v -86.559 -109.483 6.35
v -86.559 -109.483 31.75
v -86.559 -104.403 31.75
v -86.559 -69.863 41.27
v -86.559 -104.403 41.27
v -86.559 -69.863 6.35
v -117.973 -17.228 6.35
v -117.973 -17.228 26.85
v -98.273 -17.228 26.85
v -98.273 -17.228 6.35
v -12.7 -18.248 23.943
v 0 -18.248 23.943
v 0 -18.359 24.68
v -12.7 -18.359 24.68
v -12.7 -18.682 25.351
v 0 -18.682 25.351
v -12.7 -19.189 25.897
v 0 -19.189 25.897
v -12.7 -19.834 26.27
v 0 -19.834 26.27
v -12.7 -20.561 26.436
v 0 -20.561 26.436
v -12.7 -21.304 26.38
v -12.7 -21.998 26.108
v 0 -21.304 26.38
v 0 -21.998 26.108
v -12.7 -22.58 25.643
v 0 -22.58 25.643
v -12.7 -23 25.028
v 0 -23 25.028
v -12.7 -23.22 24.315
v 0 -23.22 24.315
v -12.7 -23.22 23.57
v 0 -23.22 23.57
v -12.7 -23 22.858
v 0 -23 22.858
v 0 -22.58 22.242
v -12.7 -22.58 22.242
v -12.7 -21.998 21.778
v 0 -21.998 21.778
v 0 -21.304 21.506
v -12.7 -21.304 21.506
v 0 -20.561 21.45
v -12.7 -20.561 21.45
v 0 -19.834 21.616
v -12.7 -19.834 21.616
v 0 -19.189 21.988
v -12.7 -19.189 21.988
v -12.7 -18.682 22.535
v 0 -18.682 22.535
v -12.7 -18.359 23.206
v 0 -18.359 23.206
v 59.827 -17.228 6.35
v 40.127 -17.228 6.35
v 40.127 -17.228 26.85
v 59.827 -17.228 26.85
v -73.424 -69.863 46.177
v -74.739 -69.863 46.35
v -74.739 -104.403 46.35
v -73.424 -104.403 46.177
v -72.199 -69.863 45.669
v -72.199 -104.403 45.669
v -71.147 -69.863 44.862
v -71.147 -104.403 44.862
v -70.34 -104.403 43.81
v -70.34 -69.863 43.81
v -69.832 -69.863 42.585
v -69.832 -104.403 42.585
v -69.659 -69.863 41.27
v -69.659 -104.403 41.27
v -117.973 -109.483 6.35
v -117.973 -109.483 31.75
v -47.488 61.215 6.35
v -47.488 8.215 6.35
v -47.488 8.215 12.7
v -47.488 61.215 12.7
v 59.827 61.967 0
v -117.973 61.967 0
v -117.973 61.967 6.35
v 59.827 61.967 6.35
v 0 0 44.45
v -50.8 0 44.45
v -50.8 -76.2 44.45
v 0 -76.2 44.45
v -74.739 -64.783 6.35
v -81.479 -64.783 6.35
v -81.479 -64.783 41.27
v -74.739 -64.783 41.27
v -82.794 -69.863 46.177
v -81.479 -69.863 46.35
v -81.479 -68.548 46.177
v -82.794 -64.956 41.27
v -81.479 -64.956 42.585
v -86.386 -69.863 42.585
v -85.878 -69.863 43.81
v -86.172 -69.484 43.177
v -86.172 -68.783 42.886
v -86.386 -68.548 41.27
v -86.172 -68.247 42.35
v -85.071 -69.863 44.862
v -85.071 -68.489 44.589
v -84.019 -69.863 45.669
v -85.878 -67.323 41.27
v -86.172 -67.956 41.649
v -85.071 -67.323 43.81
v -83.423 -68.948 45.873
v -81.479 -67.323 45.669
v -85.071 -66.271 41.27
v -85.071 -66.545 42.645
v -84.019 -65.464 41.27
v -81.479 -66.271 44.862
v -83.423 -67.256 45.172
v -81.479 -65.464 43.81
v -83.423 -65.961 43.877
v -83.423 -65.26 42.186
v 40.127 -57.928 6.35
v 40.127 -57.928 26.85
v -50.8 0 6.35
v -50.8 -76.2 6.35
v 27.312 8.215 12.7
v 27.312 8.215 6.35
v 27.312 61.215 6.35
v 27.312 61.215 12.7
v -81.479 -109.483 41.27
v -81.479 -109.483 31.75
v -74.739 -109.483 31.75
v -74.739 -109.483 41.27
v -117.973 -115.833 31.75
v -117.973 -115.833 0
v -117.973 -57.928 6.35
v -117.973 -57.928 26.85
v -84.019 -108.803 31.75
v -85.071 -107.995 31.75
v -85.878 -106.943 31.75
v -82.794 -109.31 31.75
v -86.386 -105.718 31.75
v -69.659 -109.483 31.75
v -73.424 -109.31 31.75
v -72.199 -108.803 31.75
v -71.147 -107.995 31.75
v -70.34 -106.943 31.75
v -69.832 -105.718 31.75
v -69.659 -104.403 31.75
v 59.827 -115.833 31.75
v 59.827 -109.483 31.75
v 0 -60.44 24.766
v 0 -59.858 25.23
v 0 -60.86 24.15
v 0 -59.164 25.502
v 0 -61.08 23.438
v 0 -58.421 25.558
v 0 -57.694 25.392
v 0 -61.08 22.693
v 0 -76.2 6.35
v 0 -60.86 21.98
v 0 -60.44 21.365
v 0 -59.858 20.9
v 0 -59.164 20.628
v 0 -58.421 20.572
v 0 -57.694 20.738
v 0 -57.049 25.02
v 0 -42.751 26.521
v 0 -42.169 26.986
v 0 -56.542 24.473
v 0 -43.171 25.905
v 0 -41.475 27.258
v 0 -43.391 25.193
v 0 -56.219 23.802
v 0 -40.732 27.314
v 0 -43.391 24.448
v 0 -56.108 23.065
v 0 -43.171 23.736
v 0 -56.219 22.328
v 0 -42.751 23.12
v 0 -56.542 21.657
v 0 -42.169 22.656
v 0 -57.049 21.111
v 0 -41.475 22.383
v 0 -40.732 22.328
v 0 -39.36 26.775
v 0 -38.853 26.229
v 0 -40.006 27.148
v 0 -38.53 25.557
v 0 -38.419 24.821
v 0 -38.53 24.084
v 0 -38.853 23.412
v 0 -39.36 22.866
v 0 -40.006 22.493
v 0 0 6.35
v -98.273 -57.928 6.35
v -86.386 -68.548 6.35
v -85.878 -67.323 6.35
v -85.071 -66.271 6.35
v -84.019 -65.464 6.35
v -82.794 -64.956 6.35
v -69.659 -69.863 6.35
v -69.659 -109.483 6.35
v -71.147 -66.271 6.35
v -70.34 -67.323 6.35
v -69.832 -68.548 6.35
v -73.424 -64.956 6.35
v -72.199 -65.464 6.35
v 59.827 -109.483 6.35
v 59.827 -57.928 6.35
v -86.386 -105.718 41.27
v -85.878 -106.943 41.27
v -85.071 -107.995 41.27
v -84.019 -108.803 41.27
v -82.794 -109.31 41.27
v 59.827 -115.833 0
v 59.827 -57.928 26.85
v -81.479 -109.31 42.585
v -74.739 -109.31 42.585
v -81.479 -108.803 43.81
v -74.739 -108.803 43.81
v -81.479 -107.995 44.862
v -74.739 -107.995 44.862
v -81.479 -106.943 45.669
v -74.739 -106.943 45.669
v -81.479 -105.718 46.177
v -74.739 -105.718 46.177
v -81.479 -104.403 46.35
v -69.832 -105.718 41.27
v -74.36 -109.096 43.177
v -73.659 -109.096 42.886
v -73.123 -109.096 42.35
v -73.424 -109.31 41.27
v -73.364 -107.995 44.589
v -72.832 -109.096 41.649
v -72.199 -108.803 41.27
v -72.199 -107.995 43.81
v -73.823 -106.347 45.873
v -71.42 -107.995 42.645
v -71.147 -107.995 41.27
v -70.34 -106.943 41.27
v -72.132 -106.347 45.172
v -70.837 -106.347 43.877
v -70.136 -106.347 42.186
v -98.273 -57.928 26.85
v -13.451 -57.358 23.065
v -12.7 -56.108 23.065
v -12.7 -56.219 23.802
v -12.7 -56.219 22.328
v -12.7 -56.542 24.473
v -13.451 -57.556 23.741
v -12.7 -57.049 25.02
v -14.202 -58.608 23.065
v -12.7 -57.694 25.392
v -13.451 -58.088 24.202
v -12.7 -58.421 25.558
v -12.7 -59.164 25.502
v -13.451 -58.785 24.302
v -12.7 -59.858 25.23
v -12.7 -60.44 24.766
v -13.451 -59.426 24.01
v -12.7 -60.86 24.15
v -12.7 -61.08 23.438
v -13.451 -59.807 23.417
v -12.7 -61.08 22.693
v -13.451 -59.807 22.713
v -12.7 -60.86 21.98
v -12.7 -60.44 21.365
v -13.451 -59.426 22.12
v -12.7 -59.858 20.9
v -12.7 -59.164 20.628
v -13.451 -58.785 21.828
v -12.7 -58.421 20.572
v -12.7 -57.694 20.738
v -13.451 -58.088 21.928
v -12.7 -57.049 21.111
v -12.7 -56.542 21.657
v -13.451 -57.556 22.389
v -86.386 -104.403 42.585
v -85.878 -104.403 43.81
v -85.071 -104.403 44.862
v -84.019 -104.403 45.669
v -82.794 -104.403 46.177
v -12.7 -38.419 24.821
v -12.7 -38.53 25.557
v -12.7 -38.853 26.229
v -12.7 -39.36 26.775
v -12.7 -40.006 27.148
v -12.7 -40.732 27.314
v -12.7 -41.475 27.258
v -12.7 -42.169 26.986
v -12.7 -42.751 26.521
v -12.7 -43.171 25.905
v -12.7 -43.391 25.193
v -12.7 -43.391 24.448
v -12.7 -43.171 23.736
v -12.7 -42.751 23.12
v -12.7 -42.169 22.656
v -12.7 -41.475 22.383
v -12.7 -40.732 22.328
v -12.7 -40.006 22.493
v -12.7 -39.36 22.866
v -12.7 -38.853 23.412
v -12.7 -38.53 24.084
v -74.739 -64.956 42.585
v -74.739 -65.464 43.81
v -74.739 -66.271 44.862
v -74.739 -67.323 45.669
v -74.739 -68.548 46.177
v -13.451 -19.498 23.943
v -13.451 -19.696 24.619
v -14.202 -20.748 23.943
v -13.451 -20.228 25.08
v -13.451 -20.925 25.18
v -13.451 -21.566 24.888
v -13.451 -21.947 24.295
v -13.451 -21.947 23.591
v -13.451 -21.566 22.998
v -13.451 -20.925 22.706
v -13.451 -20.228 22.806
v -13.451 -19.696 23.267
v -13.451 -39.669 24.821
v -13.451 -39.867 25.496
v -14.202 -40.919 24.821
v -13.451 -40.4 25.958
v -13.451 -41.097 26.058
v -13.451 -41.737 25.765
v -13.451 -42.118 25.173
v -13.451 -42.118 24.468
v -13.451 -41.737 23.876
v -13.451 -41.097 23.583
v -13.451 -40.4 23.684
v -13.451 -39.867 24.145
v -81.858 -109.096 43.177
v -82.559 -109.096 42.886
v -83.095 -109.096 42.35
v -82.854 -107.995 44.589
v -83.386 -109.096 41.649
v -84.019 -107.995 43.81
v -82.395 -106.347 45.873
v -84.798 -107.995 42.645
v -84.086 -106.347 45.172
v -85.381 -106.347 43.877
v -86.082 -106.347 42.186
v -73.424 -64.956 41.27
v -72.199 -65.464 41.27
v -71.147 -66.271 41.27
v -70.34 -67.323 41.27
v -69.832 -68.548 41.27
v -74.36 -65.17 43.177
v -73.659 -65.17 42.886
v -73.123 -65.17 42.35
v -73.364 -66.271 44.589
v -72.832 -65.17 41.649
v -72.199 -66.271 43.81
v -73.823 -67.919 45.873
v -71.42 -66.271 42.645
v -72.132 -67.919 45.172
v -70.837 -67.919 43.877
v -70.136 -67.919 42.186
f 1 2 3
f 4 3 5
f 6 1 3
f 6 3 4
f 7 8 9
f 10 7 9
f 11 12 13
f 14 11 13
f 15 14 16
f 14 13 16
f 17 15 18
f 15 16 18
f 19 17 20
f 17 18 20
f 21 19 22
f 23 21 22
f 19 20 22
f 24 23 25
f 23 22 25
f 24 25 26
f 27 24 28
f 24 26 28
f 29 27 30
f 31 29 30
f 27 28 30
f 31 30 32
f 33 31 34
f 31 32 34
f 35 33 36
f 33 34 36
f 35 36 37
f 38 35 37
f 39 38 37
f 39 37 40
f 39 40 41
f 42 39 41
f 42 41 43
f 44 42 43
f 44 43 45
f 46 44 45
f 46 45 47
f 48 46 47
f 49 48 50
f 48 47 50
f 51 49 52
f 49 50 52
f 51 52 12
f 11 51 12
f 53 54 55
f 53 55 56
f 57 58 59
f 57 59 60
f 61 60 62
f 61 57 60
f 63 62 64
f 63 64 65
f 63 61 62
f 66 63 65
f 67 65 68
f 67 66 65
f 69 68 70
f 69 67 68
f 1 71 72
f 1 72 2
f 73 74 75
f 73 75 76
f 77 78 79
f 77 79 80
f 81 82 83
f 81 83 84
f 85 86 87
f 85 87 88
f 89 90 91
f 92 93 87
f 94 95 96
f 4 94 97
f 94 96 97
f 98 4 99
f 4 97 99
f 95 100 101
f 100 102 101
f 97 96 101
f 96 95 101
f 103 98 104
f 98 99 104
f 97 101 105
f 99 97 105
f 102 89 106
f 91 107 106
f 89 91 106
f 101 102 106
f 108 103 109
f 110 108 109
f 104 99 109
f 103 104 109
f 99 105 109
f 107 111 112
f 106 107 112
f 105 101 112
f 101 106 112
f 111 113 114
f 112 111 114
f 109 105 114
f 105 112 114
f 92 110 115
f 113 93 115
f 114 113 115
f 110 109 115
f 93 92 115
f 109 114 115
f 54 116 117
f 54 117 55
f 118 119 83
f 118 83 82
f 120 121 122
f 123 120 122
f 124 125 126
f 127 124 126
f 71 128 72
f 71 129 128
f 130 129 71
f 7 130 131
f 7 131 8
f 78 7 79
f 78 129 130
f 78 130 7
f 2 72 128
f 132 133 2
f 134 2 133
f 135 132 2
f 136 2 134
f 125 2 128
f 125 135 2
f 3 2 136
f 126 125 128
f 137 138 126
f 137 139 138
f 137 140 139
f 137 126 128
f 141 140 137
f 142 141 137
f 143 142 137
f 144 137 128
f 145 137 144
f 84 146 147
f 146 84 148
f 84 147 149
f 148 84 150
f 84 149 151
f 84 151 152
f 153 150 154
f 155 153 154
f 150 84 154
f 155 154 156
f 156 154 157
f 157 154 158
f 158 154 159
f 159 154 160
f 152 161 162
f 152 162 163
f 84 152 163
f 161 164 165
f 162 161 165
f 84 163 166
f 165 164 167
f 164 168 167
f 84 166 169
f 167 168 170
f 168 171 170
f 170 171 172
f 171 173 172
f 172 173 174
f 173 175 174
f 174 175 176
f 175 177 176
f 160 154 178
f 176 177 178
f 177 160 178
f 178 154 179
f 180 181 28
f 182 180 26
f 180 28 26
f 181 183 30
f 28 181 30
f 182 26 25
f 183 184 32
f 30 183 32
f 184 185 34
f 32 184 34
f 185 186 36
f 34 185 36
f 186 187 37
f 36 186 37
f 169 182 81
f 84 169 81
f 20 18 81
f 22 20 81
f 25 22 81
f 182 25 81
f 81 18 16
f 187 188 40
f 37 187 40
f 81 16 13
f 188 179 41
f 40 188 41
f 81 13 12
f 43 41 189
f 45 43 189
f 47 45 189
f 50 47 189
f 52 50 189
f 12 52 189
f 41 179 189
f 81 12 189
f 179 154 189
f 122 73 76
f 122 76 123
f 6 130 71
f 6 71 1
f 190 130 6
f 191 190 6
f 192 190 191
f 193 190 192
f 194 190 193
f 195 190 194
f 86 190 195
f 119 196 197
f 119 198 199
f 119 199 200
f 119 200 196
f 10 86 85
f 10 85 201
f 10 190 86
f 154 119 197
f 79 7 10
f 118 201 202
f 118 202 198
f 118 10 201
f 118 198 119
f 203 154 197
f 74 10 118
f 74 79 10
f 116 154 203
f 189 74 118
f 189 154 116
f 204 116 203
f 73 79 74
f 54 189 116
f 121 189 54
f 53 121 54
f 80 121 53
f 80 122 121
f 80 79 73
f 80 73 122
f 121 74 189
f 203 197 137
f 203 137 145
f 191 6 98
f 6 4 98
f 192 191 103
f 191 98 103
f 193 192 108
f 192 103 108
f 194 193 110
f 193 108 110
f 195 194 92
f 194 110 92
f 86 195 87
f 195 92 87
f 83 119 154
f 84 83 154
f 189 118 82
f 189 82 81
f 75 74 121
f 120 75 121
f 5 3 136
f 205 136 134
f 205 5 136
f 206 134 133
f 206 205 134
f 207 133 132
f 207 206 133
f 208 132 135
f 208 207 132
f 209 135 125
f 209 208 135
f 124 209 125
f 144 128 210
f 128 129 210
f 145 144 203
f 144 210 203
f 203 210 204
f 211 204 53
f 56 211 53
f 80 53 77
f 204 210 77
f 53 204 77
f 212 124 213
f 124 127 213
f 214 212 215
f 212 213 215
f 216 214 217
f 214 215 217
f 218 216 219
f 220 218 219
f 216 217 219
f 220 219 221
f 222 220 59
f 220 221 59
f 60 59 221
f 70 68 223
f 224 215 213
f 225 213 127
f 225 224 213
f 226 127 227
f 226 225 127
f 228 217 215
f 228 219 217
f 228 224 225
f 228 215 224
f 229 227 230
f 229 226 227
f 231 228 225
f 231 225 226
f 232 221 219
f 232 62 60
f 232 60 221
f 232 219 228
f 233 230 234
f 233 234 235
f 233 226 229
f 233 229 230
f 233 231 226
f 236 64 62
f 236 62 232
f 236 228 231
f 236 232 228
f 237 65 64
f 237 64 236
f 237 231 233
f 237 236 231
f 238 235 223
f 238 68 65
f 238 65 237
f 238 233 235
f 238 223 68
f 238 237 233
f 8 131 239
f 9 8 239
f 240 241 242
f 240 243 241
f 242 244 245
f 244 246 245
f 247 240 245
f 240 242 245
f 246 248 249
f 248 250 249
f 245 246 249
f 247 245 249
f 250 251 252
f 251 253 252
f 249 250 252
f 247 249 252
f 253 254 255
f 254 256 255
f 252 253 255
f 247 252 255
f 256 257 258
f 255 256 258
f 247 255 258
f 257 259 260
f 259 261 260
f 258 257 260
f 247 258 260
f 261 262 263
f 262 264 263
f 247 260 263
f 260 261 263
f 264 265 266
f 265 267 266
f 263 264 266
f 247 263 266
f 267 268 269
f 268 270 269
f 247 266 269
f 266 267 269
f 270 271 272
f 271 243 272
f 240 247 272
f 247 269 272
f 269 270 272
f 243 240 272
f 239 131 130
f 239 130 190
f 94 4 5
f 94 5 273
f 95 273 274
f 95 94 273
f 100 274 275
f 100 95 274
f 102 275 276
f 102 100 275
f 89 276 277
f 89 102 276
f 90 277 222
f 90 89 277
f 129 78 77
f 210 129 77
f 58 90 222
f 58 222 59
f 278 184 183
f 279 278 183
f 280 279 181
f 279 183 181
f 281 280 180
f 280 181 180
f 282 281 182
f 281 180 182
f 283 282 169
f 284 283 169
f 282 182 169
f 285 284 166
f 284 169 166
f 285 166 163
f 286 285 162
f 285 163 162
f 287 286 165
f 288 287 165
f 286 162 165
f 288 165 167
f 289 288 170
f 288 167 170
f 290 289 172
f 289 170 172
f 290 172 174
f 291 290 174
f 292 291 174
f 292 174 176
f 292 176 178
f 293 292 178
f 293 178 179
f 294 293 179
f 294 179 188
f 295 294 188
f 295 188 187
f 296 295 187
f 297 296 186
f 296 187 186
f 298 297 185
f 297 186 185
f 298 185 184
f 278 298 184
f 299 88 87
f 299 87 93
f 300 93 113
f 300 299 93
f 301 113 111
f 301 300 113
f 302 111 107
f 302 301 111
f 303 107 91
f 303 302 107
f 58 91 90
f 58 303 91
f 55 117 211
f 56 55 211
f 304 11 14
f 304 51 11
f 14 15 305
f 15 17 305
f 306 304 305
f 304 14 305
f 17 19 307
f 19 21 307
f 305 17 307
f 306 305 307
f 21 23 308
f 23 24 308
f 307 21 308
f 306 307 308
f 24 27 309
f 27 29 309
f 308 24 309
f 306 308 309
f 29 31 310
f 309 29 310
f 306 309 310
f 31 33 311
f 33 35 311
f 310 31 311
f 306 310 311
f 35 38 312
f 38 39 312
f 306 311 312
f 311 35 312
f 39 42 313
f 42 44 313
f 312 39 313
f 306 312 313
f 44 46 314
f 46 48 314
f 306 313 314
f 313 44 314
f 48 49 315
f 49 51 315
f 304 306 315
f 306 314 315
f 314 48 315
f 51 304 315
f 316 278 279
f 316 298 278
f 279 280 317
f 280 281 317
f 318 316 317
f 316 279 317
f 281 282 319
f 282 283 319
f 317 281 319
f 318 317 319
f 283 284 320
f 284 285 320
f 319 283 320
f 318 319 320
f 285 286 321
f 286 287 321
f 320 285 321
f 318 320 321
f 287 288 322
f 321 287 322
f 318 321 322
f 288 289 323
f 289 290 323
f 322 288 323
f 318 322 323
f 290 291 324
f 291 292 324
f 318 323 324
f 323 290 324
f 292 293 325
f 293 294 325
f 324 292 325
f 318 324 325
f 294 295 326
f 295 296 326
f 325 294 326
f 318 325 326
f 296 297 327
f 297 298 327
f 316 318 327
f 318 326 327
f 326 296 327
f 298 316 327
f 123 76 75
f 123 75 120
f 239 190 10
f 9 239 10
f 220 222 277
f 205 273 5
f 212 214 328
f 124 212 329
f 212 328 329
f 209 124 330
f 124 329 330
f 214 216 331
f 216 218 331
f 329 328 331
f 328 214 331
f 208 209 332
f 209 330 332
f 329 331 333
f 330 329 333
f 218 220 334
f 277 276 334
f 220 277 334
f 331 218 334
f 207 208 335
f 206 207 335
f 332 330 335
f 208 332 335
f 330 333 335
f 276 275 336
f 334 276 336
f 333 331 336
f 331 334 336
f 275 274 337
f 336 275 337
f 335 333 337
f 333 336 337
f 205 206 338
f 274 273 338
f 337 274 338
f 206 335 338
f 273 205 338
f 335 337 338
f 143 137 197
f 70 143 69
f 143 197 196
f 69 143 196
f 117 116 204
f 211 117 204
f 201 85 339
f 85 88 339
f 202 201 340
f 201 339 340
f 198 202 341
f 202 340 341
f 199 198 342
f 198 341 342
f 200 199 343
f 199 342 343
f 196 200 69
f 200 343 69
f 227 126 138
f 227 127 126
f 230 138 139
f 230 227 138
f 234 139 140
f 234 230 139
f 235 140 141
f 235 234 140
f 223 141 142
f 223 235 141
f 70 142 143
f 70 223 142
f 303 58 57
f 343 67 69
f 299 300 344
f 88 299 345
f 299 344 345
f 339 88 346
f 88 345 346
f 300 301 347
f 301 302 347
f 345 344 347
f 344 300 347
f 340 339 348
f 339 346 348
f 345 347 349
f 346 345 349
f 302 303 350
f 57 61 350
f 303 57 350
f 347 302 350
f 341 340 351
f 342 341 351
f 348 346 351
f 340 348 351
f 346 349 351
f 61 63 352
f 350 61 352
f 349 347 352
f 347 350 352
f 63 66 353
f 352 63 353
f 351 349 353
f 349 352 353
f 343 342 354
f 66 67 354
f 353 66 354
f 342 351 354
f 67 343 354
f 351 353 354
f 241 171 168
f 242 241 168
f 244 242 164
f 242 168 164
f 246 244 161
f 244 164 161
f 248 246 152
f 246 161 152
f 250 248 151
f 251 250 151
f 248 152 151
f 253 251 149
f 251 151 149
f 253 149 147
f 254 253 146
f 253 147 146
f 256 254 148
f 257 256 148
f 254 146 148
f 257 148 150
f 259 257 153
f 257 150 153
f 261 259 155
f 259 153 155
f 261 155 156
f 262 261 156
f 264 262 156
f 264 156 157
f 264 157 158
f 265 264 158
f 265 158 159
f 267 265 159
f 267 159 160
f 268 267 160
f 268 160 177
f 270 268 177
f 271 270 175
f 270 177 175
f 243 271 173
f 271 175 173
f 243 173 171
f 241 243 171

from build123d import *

# Parameters (mm, degrees)
F0_W      = 177.8
F0_H      = 177.8
F1_DEPTH  = 6.35
F2_W      = 19.7
F2_H      = 40.7
F3_DEPTH  = 20.5
F4_W      = 50.8
F4_H      = 76.2
F5_DEPTH  = 38.1
F6_W      = 74.8
F6_H      = 53
F7_DEPTH  = 6.35
F8_W      = 177.8
F8_H      = 6.35
F9_DEPTH  = 25.4
F10_W     = 16.9
F10_H     = 44.7
F11_DEPTH = 40
F13_D     = 5
F13_DEPTH = 12.7
F13_TIP   = 1.5021515476
F14_R     = 5.08


# Not quite as in the source:
# - a feature of the source that left no trace in its solid (it failed there, or was rolled back) is left out


with BuildPart() as f1:
    # F0 (on Top) → F1 (new body)
    with BuildSketch(Plane.XY):
        with Locations((-29.0734948754, -26.9331749929)):
            Rectangle(F0_W, F0_H)
    extrude(amount=F1_DEPTH)

    # F2 (on face) → F3 (join)
    with BuildSketch(Plane.XY.offset(6.35)):
        with Locations((49.9765051246, -37.5782008111)):
            Rectangle(F2_W, F2_H)
        with Locations((-108.1234948754, -37.5782008111)):
            Rectangle(F2_W, F2_H)
    extrude(amount=F3_DEPTH)

    # F4 (on face) → F5 (join)
    with BuildSketch(Plane.XY.offset(6.35)):
        with Locations((-25.4, -38.1)):
            Rectangle(F4_W, F4_H)
    extrude(amount=F5_DEPTH)

    # F6 (on face) → F7 (join)
    with BuildSketch(Plane.XY.offset(6.35)):
        with Locations((-10.0883172065, 34.7147134863)):
            Rectangle(F6_W, F6_H)
    extrude(amount=F7_DEPTH)

    # F8 (on face) → F9 (join)
    with BuildSketch(Plane.XY.offset(6.35)):
        with Locations((-29.0734948754, -112.6581749929)):
            Rectangle(F8_W, F8_H)
    extrude(amount=F9_DEPTH)

    # F10 (on face) → F11 (join)
    with BuildSketch(Plane.XY.offset(6.35)):
        with Locations((-78.1089827299, -87.1331749929)):
            Rectangle(F10_W, F10_H)
    extrude(amount=F11_DEPTH)

    # F13 (one way)
    with BuildSketch(Plane.YZ):
        with Locations((-58.6075335741, 23.0651237071), (-40.9188605845, 24.820599705), (-20.7475721836, 23.942861706)):
            Circle(F13_D / 2)
    extrude(amount=-F13_DEPTH, mode=Mode.SUBTRACT)
    with Locations(Plane.YZ):
        with Locations((-58.6075335741, 23.0651237071), (-40.9188605845, 24.820599705), (-20.7475721836, 23.942861706)):
            with Locations((0, 0, -(F13_DEPTH + F13_TIP / 2))):  # 118° drill point
                Cone(0, F13_D / 2, F13_TIP, mode=Mode.SUBTRACT)

    # F14
    f14_edges = [f1.edges().sort_by_distance(p)[0] for p in [
        (-69.658983, -87.133175, 46.35),
        (-78.108983, -64.783175, 46.35),
        (-86.558983, -87.133175, 46.35),
        (-78.108983, -109.483175, 46.35),
        (-86.558983, -64.783175, 26.35),
        (-69.658983, -64.783175, 26.35),
        (-69.658983, -109.483175, 39.05),
        (-86.558983, -109.483175, 39.05),
    ]]
    fillet(f14_edges, radius=F14_R)


solid = f1.part
